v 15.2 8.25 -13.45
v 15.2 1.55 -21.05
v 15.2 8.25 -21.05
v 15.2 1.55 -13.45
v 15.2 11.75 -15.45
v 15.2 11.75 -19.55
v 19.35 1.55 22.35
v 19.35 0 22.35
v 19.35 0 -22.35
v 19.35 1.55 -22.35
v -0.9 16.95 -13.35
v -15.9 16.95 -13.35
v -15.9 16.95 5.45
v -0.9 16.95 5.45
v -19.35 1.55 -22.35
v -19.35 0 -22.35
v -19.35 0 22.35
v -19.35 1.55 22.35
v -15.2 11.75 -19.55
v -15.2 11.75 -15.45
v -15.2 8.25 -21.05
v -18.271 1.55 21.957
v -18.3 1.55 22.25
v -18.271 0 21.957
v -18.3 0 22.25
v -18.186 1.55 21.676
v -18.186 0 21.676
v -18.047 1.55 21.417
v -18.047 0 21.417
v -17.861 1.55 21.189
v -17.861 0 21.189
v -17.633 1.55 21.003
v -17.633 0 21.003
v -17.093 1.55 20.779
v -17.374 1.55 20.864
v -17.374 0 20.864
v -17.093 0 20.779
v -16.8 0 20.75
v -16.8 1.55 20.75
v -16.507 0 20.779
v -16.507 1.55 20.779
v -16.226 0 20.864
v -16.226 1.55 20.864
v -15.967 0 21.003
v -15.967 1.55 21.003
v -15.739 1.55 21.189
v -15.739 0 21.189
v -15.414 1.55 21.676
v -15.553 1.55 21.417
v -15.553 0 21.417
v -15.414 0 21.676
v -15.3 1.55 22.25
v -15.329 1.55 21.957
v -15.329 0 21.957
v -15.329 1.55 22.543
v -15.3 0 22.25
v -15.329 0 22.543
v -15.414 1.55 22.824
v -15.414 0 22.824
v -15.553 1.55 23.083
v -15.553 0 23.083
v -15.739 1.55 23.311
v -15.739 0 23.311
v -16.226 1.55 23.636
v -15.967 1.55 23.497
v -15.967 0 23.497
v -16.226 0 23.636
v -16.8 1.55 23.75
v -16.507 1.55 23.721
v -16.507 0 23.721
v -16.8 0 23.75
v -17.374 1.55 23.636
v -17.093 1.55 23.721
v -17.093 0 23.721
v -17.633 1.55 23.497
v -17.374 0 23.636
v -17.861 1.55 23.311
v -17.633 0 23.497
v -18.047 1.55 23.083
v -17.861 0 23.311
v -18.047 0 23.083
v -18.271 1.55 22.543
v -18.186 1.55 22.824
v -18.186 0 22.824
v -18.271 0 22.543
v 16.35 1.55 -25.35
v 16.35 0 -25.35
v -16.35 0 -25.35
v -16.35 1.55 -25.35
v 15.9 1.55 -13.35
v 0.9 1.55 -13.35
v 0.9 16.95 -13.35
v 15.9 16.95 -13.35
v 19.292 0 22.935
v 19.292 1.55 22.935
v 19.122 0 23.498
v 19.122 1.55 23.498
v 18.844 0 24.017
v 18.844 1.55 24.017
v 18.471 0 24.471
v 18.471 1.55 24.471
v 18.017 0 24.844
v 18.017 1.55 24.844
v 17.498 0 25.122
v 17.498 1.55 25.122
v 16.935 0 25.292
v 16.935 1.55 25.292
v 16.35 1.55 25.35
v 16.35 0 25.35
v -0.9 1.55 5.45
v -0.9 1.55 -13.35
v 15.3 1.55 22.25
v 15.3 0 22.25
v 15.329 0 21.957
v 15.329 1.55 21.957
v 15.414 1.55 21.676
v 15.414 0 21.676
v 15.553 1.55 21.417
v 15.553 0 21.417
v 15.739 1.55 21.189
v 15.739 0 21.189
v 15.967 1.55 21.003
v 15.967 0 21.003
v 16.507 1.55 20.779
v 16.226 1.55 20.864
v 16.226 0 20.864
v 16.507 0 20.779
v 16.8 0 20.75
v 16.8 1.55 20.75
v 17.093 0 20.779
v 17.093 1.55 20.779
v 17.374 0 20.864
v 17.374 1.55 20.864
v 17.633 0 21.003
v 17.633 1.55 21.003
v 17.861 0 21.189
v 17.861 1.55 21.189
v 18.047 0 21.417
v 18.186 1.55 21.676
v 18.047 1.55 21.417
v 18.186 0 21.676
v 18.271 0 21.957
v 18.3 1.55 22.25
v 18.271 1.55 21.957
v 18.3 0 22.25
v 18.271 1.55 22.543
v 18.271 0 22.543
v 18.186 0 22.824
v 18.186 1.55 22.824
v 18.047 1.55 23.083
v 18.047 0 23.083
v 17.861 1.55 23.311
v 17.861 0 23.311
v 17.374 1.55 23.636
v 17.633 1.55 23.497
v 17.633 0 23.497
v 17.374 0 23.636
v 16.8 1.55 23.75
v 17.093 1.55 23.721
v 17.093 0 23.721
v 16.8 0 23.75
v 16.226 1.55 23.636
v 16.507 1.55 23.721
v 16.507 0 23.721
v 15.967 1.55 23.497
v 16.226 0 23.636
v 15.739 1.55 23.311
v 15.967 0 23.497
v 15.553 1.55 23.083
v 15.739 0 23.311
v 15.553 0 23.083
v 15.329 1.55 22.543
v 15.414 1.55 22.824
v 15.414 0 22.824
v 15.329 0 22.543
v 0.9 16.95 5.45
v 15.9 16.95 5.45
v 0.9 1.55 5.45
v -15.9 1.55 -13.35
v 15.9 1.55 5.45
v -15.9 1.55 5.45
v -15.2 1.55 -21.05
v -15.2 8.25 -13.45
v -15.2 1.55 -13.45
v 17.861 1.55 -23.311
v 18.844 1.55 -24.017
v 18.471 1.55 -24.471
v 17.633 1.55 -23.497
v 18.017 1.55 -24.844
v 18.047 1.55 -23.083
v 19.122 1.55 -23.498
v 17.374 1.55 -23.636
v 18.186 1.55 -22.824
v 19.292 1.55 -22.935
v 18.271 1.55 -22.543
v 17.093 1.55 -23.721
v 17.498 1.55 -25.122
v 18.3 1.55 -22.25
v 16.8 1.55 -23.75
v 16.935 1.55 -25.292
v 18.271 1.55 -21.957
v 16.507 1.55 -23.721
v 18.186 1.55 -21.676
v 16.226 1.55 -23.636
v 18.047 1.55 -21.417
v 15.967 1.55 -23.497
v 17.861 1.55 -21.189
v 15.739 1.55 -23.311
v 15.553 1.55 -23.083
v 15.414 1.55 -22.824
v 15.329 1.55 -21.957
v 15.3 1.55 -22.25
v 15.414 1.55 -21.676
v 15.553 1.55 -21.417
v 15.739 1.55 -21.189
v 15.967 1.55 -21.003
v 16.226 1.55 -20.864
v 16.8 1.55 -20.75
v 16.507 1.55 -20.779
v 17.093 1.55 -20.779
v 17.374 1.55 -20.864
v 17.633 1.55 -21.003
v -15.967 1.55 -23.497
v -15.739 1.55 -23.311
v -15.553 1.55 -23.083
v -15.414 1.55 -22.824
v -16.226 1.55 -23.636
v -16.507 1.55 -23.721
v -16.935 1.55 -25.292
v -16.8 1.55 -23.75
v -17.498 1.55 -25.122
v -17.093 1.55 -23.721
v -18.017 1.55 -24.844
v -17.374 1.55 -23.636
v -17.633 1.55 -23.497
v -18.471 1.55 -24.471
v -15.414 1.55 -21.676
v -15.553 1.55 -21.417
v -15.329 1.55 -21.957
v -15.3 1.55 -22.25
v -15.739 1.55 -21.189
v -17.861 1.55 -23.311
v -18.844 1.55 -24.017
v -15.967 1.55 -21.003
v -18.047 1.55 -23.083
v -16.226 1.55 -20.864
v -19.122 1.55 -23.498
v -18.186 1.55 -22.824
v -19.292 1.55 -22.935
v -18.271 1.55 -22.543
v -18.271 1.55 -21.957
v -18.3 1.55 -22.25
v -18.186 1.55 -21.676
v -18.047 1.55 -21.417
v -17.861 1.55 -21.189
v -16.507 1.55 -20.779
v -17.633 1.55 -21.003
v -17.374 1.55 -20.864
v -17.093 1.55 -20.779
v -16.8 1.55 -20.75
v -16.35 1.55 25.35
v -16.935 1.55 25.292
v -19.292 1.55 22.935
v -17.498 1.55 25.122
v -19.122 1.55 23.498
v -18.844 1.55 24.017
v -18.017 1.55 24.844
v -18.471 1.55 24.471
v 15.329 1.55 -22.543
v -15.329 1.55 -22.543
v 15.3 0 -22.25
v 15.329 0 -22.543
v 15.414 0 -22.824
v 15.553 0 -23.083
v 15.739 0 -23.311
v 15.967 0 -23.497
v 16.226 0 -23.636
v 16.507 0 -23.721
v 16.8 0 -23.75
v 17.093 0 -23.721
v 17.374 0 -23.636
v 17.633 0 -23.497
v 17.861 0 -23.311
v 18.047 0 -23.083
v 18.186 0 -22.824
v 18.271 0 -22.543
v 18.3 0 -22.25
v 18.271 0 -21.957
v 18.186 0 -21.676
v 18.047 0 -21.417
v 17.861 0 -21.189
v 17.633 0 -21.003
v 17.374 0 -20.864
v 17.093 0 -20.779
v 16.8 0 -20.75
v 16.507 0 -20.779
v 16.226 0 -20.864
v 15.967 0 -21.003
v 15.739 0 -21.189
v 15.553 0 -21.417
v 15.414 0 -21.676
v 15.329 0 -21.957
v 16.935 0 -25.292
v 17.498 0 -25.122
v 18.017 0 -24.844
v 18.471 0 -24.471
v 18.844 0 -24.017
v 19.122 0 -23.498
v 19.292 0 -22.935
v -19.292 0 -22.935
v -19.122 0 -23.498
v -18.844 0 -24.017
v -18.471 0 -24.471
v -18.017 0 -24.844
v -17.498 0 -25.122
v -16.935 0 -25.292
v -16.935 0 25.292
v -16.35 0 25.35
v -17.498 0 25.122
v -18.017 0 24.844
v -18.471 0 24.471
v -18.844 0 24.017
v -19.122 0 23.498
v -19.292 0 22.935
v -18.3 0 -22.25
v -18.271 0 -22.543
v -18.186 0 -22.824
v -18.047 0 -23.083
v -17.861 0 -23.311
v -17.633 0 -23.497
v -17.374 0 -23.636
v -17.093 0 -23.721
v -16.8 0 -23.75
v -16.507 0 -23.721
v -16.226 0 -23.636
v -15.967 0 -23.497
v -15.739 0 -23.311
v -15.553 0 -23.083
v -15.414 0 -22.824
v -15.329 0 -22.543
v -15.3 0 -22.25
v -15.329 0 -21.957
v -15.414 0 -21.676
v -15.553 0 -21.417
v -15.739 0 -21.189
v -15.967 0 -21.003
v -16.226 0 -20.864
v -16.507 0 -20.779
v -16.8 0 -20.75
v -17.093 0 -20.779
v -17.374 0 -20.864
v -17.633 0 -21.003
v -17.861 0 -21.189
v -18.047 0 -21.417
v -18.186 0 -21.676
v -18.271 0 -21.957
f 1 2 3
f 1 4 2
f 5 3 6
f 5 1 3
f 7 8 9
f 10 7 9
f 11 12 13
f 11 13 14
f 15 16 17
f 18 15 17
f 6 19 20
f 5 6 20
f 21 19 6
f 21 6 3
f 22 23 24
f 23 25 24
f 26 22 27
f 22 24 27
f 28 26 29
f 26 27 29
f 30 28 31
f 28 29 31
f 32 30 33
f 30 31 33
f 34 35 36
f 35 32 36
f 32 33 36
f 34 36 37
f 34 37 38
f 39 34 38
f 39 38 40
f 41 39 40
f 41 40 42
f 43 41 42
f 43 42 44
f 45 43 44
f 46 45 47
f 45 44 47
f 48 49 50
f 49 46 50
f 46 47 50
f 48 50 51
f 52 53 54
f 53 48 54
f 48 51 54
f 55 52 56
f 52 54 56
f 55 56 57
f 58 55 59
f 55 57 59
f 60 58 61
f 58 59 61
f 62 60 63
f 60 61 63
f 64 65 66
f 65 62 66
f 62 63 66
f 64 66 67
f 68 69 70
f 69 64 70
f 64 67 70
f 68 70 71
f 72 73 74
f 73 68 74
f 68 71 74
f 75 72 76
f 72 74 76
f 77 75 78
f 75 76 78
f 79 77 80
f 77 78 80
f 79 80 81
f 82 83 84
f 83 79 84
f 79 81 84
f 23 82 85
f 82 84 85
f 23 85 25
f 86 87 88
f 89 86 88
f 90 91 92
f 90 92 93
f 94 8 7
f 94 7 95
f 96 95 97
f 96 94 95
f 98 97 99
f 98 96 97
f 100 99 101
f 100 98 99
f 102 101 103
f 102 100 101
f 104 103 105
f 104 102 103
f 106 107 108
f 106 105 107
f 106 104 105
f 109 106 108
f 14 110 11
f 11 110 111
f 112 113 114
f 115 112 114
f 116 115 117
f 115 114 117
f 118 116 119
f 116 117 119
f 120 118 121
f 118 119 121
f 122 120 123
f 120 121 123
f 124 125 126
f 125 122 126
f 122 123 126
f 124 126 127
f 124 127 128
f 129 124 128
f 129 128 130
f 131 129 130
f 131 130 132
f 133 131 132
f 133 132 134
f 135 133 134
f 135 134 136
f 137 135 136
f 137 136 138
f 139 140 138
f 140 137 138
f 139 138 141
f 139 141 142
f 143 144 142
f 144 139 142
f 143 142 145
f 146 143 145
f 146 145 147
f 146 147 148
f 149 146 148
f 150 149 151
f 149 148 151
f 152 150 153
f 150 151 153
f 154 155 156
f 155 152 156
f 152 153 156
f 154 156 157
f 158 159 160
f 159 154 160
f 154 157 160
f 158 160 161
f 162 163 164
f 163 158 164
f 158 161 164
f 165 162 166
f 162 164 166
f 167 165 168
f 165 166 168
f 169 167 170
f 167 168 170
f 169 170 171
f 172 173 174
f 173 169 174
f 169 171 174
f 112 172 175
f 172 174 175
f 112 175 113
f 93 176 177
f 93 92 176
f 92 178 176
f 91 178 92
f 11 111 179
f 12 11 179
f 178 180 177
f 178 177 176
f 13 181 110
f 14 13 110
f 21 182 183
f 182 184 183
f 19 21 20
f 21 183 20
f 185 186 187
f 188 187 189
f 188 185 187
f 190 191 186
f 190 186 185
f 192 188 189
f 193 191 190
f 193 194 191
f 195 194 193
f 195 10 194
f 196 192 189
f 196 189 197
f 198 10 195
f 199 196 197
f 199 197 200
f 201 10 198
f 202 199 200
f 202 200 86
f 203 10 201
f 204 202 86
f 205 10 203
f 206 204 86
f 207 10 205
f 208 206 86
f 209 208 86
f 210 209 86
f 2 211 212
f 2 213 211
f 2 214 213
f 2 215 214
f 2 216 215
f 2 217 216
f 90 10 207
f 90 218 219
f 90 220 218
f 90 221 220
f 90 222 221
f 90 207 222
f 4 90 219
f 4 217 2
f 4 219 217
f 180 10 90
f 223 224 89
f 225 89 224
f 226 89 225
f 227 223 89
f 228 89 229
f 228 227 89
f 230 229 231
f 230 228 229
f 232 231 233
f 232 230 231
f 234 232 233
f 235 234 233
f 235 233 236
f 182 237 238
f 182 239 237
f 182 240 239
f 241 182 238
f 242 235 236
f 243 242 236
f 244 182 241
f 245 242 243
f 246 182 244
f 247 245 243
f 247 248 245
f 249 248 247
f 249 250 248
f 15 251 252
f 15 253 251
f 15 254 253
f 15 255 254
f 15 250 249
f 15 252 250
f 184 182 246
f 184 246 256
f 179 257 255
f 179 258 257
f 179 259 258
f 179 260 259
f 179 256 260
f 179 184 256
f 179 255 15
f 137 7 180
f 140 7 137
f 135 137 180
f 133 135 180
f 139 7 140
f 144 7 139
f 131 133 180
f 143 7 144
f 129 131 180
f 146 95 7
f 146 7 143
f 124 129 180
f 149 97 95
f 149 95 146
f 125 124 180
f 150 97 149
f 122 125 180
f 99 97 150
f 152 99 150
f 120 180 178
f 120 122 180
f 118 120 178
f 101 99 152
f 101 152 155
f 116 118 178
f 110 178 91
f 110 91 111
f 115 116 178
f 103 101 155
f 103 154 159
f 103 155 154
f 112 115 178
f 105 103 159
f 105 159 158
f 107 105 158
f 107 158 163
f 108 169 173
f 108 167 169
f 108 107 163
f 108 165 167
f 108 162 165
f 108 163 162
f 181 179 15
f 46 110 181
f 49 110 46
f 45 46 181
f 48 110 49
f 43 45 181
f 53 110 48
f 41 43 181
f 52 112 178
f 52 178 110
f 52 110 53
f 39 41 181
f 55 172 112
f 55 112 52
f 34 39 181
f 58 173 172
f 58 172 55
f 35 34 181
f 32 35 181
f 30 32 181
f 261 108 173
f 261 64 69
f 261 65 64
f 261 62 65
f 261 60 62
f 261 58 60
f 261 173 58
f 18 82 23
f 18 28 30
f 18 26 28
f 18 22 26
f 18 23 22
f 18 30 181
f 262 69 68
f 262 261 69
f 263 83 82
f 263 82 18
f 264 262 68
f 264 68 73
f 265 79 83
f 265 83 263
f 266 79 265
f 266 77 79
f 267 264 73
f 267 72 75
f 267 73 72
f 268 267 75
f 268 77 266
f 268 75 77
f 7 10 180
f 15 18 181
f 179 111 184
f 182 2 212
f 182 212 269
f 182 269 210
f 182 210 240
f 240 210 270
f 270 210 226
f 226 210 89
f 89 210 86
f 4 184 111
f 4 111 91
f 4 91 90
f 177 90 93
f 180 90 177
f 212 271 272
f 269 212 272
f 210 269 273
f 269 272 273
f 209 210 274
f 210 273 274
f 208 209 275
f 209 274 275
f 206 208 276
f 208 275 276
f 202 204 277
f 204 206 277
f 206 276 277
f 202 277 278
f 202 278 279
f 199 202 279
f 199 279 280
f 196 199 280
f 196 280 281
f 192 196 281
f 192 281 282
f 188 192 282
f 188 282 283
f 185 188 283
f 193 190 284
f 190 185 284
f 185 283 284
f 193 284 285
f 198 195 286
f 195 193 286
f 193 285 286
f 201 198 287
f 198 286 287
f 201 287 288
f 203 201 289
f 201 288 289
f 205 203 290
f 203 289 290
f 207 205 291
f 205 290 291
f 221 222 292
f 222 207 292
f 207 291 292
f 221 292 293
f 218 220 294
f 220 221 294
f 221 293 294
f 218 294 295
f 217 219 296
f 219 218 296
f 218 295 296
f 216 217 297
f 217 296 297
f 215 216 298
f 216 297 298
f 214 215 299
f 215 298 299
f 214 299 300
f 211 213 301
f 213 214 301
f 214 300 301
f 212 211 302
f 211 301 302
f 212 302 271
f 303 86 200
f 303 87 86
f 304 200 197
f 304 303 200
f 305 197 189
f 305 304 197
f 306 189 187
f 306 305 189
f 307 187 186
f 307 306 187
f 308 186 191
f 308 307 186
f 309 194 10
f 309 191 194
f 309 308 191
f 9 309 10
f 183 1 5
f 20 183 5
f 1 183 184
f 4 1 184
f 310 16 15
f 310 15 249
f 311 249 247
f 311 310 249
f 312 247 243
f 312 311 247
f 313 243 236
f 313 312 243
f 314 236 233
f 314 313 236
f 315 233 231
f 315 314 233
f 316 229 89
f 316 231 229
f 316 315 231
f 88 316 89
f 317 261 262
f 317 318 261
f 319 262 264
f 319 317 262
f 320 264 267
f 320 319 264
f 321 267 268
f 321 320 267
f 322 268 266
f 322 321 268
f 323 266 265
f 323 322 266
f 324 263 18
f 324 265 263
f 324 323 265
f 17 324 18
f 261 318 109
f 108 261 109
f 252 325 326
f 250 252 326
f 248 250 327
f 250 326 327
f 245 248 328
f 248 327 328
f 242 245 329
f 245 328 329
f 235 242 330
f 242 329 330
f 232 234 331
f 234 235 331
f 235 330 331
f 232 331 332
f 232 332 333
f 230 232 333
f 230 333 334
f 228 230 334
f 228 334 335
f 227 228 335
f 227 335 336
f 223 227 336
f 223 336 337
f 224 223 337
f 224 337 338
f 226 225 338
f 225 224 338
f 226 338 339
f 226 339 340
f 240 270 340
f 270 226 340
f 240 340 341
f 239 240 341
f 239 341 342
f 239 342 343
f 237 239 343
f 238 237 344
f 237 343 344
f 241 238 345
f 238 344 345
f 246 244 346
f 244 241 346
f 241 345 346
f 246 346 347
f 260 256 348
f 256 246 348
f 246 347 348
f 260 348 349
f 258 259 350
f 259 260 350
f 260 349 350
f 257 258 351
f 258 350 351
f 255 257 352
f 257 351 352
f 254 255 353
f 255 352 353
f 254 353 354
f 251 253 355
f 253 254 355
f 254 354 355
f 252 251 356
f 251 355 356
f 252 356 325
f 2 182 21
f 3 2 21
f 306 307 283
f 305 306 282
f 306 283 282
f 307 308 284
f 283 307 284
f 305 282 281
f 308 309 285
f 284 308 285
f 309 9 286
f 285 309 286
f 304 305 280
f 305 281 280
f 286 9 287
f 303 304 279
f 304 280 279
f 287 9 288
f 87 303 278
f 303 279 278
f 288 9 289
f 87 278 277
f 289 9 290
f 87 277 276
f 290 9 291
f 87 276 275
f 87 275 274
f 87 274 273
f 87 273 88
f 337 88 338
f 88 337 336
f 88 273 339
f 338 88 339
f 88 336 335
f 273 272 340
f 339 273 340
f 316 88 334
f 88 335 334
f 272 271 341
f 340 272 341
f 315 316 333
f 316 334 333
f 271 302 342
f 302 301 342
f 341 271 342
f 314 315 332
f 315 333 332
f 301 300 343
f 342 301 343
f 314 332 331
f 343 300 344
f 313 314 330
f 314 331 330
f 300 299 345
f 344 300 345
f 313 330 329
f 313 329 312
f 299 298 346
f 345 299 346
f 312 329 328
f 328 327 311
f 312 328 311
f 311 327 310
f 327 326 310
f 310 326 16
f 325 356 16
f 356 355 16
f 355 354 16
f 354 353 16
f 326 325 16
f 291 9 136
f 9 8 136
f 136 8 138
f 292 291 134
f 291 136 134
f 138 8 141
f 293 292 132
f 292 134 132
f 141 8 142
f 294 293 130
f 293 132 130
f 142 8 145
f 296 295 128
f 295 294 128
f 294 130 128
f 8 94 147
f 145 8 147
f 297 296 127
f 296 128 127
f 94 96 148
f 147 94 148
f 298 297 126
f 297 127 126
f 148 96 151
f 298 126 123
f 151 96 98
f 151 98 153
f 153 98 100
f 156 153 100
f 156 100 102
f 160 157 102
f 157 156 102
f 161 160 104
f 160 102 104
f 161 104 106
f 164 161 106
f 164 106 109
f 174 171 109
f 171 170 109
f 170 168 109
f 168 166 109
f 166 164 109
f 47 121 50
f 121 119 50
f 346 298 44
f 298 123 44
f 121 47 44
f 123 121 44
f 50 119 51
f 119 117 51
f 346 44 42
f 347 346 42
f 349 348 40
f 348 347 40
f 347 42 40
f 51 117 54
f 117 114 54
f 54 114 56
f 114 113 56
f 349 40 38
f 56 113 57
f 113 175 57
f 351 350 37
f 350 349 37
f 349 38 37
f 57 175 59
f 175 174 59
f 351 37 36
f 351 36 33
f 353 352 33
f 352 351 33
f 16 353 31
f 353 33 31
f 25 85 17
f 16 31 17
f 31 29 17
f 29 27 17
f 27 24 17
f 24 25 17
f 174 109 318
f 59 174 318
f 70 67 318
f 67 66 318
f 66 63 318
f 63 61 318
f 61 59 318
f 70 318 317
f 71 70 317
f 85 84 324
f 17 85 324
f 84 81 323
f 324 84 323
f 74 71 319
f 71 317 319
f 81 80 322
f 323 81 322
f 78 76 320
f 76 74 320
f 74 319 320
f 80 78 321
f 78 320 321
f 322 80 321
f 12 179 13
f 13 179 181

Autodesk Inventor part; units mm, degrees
ref_plane "YZ Plane" through (0, 0, 0) normal (1, 0, 0) x (0, 1, 0)
ref_plane "XZ Plane" through (0, 0, 0) normal (0, 1, 0) x (-1, 0, 0)
ref_plane "XY Plane" through (0, 0, 0) normal (0, 0, 1) x (1, 0, 0)
sketch "스케치2" plane through (0, 0, 0) normal (0, 1, 0) x (-1, 0, 0)
  line L0 (-16.35, -25.35) -> (16.35, -25.35)
  line L1 (19.35, -22.35) -> (19.35, 22.35)
  line L2 (16.35, 25.35) -> (-16.35, 25.35)
  line L3 (-19.35, 22.35) -> (-19.35, -22.35)
  line L4 (-19.35, -25.35) -> (19.35, 25.35) construction
  line L5 (19.35, -25.35) -> (-19.35, 25.35) construction
  circle A0 centre (16.8, 22.25) radius 1.5
  line L6 (0, 0) -> (0, -6.2498)
  line L7 (0, 0) -> (4.685, 0)
  circle A1 centre (16.8, -22.25) radius 1.5
  circle A2 centre (-16.8, 22.25) radius 1.5
  circle A3 centre (-16.8, -22.25) radius 1.5
  arc A4 (19.35, 22.35) -> (16.35, 25.35) centre (16.35, 22.35) ccw
  arc A5 (16.35, -25.35) -> (19.35, -22.35) centre (16.35, -22.35) ccw
  arc A6 (-19.35, -22.35) -> (-16.35, -25.35) centre (-16.35, -22.35) ccw
  arc A7 (-16.35, 25.35) -> (-19.35, 22.35) centre (-16.35, 22.35) ccw
  dimension "d0" = 38.7
  dimension "d1" = 50.7
  dimension "d2" = 3
  dimension "d4" = 44.5
  dimension "d5" = 3
  dimension "d24" = 33.6
extrude "돌출1" add sketch "스케치2" along normal blind 1.55
sketch "스케치3" plane through (0, 1.55, 0) normal (0, 1, 0) x (1, 0, 0)
  line L0 (-15.9, -5.45) -> (-0.9, -5.45)
  line L1 (-0.9, -5.45) -> (-0.9, 13.35)
  line L2 (-0.9, 13.35) -> (-15.9, 13.35)
  line L3 (-15.9, 13.35) -> (-15.9, -5.45)
  line L4 (-15.9, -5.45) -> (-0.9, 13.35) construction
  line L5 (-0.9, -5.45) -> (-15.9, 13.35) construction
  line L6 (16.35, 25.35) -> (-16.35, 25.35) projected
  line L7 (0, 0) -> (0, -13.7943)
  line L8 (15.9, -5.45) -> (0.9, -5.45)
  line L9 (0.9, -5.45) -> (0.9, 13.35)
  line L10 (0.9, 13.35) -> (15.9, 13.35)
  line L11 (15.9, 13.35) -> (15.9, -5.45)
  line L12 (15.9, -5.45) -> (0.9, 13.35) construction
  line L13 (0.9, -5.45) -> (15.9, 13.35) construction
  point P0 (-8.4, 3.95)
  point P1 (8.4, 3.95)
  dimension "d8" = 15
  dimension "d9" = 18.8
  dimension "d10" = 0.9
  dimension "d11" = 12
extrude "돌출2" add sketch "스케치3" along normal blind 15.4
sketch "스케치4" plane through (0, 0, 0) normal (1, 0, 0) x (0, 1, 0)
  line L0 (1.55, -22.35) -> (1.55, 22.35) projected
  line L1 (11.75, -13.45) -> (1.55, -13.45)
  line L2 (1.55, -13.45) -> (1.55, -21.05)
  line L3 (1.55, -21.05) -> (11.75, -21.05)
  line L4 (11.75, -21.05) -> (11.75, -13.45)
  line L5 (0, -25.35) -> (1.55, -25.35) projected
  line L6 (11.75, -19.55) -> (8.25, -21.05)
  line L7 (1.55, -13.35) -> (16.95, -13.35) projected
  line L8 (8.25, -13.45) -> (11.75, -15.45)
  point P0 (0, 0)
  point P1 (1.55, -13.45)
  dimension "d16" = 7.6
  dimension "d17" = 10.2
  dimension "d18" = 4.3
  dimension "d19" = 1.5
  dimension "d20" = 2
  dimension "d21" = 3.5
extrude "돌출3" add sketch "스케치4" along normal mid plane 30.4 contours L0 L1 L8 L4 L6 L3
properties part number "더블 릴레이 모듈"
